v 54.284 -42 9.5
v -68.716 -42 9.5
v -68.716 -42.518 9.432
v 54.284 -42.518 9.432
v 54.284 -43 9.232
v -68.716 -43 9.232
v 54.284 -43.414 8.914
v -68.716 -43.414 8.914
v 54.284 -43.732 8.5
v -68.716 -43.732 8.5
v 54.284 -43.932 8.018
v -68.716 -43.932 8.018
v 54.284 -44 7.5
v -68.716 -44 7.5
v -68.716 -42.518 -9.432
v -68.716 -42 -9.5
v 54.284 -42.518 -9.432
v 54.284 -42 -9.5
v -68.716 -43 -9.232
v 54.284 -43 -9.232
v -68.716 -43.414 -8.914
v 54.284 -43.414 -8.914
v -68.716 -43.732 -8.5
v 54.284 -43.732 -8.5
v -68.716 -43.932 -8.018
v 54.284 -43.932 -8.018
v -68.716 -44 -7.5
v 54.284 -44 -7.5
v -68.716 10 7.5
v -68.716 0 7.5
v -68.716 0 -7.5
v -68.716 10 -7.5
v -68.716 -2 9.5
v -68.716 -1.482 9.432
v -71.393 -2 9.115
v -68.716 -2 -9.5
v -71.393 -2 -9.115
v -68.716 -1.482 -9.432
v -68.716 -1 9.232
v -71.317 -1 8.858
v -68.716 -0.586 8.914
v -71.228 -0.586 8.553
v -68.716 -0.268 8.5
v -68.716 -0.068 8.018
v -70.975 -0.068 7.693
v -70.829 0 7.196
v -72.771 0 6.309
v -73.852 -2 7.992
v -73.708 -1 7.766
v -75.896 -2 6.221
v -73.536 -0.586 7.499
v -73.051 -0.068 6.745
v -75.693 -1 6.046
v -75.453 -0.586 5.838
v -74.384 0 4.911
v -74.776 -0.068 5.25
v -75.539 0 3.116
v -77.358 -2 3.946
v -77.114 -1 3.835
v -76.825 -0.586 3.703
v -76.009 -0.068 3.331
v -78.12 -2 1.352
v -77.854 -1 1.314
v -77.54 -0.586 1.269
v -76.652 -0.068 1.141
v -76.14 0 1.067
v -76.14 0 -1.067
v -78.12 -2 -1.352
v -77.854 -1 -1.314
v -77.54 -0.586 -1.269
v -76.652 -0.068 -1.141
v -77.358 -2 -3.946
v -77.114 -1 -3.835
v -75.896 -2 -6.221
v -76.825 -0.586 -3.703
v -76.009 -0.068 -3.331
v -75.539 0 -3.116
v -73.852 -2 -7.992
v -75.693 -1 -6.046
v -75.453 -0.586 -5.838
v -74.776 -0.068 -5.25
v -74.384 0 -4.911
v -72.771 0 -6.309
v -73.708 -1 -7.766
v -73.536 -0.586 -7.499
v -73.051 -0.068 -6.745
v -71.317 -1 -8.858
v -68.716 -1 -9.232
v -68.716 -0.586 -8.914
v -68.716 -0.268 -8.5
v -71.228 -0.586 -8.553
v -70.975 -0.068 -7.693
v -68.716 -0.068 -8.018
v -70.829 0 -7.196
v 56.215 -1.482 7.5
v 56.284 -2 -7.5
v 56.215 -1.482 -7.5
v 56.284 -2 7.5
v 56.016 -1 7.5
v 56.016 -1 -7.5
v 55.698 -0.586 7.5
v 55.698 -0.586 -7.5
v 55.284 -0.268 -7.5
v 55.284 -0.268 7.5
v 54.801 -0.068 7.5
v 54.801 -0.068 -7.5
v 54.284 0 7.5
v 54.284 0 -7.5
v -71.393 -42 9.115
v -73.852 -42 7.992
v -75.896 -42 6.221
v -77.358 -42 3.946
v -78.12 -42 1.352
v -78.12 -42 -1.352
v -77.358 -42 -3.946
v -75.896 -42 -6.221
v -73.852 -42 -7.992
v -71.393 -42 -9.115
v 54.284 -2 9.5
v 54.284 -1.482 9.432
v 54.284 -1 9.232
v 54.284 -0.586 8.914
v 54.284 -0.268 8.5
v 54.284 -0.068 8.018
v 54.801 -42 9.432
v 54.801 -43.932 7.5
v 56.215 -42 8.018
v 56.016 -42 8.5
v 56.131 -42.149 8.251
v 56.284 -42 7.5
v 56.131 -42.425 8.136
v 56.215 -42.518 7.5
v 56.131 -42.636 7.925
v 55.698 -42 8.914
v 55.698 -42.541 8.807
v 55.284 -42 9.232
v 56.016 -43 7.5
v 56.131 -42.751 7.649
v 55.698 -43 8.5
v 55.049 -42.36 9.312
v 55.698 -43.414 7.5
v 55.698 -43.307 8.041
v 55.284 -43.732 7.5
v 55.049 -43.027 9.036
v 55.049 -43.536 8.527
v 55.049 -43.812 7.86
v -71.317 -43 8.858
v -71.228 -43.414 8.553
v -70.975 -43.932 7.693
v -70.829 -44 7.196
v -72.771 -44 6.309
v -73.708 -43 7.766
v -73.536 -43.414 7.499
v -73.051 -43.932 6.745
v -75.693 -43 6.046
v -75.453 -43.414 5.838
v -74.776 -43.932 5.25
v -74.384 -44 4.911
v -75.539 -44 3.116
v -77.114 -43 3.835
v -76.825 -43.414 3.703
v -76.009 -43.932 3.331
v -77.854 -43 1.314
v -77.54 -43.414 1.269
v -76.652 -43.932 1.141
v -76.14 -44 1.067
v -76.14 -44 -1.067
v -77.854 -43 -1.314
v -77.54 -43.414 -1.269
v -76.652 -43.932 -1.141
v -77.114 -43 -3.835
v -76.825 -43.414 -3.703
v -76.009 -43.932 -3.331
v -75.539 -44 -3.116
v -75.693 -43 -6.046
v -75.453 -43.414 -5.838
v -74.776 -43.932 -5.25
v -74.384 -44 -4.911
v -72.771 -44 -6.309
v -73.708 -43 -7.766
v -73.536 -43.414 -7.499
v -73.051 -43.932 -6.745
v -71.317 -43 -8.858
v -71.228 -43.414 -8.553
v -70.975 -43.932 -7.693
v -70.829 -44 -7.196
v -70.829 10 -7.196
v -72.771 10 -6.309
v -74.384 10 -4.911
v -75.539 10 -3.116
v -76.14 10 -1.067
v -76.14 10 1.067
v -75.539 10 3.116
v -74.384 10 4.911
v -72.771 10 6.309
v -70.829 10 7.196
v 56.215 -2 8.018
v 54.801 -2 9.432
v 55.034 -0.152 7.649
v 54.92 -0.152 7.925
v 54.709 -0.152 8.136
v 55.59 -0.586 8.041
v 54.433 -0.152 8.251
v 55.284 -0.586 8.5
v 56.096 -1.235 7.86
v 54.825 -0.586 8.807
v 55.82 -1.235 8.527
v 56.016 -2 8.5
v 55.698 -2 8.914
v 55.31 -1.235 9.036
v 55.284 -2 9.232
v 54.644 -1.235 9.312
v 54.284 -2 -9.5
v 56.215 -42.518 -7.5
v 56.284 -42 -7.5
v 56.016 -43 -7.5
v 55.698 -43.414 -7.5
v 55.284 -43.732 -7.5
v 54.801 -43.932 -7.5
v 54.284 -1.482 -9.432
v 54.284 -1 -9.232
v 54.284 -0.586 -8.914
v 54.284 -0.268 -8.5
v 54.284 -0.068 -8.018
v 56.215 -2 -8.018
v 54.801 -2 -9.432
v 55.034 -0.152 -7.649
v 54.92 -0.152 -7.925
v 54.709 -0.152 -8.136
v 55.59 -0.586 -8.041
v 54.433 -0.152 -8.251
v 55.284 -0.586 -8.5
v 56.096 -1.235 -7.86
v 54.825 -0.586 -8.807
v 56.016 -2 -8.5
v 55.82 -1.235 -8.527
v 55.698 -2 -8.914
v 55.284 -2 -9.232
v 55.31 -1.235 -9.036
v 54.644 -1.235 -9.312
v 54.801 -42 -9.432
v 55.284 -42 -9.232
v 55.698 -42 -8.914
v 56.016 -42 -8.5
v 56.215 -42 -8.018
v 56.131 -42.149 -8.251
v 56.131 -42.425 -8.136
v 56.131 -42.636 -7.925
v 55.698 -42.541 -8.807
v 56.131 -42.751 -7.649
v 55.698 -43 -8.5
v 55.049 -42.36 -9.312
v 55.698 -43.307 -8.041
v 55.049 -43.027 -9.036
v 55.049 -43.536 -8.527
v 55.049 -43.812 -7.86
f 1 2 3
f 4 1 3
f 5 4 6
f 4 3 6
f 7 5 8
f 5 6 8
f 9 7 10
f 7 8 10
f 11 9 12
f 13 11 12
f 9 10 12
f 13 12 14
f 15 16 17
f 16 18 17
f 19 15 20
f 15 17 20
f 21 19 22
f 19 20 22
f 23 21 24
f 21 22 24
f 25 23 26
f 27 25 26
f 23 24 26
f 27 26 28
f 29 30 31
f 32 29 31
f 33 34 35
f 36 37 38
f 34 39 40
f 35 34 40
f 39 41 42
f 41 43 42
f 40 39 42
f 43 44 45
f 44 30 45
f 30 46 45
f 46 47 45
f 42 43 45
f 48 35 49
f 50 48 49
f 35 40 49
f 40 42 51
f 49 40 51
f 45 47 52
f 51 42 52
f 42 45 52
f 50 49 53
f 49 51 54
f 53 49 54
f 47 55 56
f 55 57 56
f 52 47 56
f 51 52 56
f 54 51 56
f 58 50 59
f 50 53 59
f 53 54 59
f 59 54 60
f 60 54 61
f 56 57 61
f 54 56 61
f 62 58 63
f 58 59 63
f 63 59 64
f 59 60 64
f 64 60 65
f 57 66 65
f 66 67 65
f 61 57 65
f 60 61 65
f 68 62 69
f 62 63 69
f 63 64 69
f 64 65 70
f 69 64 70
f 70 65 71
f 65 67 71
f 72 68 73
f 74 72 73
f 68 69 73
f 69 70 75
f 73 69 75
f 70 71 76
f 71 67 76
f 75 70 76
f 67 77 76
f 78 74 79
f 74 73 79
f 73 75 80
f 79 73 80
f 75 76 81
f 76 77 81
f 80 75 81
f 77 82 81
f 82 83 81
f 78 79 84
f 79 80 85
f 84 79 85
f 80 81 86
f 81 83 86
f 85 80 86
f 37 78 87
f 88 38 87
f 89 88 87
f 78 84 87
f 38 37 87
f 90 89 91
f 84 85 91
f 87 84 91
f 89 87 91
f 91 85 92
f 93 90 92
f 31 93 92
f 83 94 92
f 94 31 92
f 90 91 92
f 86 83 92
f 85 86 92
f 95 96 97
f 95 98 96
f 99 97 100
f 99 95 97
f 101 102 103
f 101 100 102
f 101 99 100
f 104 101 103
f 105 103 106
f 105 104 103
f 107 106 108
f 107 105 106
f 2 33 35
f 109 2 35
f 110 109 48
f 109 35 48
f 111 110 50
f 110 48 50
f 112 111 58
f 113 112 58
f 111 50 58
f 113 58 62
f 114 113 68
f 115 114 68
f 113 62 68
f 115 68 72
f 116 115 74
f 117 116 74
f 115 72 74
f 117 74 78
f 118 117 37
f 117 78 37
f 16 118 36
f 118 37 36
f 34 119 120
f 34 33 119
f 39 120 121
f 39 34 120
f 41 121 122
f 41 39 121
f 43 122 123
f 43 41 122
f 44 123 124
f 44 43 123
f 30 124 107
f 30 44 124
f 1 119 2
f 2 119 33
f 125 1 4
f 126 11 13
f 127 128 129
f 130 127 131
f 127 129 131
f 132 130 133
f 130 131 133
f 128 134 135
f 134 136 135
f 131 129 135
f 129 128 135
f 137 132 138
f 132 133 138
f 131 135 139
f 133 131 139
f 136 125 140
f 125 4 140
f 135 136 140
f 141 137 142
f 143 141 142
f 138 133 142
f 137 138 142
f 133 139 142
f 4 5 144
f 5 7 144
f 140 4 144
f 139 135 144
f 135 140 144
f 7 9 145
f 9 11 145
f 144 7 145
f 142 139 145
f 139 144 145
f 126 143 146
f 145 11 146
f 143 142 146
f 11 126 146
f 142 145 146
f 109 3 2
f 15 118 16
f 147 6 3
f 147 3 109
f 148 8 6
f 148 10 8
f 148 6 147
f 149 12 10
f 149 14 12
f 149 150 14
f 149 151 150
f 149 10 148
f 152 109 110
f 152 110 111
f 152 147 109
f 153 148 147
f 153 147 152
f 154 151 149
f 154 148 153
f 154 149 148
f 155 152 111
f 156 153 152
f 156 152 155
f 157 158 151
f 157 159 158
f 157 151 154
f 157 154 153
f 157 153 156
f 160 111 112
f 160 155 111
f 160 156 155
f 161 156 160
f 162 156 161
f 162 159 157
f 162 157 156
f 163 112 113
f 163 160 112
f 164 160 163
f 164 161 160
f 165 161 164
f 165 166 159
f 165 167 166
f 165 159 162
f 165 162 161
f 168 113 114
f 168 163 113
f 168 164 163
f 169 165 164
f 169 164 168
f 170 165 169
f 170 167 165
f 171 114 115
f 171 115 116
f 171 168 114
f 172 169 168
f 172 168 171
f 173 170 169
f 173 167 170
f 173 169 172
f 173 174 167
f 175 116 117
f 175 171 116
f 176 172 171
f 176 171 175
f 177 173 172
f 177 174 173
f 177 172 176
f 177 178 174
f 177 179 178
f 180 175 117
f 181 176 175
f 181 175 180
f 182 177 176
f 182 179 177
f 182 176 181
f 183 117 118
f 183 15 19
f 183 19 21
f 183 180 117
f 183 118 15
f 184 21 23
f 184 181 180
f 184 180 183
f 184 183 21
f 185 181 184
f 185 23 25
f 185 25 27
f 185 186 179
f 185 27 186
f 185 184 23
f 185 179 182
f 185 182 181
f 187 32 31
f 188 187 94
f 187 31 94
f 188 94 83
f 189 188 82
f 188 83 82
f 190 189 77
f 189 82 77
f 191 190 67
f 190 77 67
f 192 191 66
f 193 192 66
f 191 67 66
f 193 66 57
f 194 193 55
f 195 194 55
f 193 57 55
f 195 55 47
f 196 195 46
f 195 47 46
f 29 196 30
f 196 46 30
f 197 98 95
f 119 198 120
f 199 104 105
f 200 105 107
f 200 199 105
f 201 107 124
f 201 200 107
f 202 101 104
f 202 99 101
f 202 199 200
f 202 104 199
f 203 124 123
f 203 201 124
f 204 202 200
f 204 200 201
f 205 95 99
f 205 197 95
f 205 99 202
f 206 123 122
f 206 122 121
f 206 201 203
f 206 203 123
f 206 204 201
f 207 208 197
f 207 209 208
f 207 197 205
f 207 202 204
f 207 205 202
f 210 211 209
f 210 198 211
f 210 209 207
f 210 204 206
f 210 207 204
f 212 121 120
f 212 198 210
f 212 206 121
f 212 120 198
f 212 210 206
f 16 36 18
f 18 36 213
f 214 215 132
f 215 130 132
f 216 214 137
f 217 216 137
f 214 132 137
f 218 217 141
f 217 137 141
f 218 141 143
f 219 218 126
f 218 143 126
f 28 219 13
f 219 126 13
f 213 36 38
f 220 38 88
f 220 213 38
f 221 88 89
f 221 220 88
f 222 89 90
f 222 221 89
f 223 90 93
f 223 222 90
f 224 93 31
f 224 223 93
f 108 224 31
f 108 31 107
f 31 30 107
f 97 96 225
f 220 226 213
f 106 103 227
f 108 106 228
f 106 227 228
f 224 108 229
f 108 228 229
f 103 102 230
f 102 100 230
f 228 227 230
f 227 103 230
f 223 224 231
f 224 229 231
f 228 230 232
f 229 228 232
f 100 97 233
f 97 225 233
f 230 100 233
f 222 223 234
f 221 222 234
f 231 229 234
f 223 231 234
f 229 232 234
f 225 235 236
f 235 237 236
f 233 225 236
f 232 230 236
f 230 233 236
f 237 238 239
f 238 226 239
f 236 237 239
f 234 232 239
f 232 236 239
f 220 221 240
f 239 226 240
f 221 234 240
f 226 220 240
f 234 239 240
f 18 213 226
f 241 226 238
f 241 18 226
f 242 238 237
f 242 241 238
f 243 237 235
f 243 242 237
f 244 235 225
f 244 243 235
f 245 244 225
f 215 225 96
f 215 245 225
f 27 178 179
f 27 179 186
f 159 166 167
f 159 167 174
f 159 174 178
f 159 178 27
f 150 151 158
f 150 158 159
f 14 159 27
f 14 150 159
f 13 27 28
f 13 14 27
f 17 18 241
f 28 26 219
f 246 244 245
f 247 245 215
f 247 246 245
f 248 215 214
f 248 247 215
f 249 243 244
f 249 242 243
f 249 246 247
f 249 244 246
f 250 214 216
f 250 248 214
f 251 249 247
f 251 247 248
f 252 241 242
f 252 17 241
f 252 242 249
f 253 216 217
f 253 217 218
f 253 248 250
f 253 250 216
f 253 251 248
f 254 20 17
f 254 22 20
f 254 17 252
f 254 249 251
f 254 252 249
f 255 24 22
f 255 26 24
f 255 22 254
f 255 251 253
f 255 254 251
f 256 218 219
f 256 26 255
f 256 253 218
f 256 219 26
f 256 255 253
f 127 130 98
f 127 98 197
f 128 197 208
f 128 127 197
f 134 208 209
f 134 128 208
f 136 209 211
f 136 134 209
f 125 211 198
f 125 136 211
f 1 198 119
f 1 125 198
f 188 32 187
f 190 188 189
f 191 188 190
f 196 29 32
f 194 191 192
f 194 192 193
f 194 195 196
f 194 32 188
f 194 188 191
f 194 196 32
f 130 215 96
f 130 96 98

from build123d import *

# Parameters (mm, degrees)
F1_DEPTH = 44
F2_R     = 2
F4_DEPTH = 10


with BuildPart() as f1:
    # F0 (on Front) → F1 (new body)
    with BuildSketch(Plane.XZ):
        with BuildLine():
            ThreePointArc((-68.716378, -9.5), (-61.998863, -6.717514), (-59.216378, 0))
            ThreePointArc((-59.216378, 0), (-61.998863, 6.717514), (-68.716378, 9.5))
            ThreePointArc((-68.716378, 9.5), (-78.216378, 0), (-68.716378, -9.5))
        make_face()
        with BuildLine():
            ThreePointArc((-68.716378, 9.5), (-61.998863, 6.717514), (-59.216378, 0))
            ThreePointArc((-59.216378, 0), (-61.998863, -6.717514), (-68.716378, -9.5))
            Line((-68.716378, -9.5), (56.283622, -9.5))
            Line((56.283622, -9.5), (56.283622, 9.5))
            Line((56.283622, 9.5), (-68.716378, 9.5))
        make_face()
    extrude(amount=F1_DEPTH)

    # F2
    f2_edges = [f1.edges().sort_by_distance(p)[0] for p in [
        (-6.216378, -44, 9.5),
        (56.283622, -22, 9.5),
        (56.283622, -22, -9.5),
        (56.283622, -44, 0),
        (56.283622, 0, 0),
        (-6.216378, 0, -9.5),
        (-6.216378, 0, 9.5),
    ]]
    fillet(f2_edges, radius=F2_R)

    # F3 (on face) → F4 (join)
    with BuildSketch(Plane(origin=(0, 0, 0), x_dir=(-1, 0, 0), z_dir=(0, 1, 0))):
        with BuildLine():
            ThreePointArc((68.716378, -7.5), (76.216378, 0), (68.716378, 7.5))
            Line((68.716378, 7.5), (68.716378, -7.5))
        make_face()
    extrude(amount=F4_DEPTH)


solid = f1.part
